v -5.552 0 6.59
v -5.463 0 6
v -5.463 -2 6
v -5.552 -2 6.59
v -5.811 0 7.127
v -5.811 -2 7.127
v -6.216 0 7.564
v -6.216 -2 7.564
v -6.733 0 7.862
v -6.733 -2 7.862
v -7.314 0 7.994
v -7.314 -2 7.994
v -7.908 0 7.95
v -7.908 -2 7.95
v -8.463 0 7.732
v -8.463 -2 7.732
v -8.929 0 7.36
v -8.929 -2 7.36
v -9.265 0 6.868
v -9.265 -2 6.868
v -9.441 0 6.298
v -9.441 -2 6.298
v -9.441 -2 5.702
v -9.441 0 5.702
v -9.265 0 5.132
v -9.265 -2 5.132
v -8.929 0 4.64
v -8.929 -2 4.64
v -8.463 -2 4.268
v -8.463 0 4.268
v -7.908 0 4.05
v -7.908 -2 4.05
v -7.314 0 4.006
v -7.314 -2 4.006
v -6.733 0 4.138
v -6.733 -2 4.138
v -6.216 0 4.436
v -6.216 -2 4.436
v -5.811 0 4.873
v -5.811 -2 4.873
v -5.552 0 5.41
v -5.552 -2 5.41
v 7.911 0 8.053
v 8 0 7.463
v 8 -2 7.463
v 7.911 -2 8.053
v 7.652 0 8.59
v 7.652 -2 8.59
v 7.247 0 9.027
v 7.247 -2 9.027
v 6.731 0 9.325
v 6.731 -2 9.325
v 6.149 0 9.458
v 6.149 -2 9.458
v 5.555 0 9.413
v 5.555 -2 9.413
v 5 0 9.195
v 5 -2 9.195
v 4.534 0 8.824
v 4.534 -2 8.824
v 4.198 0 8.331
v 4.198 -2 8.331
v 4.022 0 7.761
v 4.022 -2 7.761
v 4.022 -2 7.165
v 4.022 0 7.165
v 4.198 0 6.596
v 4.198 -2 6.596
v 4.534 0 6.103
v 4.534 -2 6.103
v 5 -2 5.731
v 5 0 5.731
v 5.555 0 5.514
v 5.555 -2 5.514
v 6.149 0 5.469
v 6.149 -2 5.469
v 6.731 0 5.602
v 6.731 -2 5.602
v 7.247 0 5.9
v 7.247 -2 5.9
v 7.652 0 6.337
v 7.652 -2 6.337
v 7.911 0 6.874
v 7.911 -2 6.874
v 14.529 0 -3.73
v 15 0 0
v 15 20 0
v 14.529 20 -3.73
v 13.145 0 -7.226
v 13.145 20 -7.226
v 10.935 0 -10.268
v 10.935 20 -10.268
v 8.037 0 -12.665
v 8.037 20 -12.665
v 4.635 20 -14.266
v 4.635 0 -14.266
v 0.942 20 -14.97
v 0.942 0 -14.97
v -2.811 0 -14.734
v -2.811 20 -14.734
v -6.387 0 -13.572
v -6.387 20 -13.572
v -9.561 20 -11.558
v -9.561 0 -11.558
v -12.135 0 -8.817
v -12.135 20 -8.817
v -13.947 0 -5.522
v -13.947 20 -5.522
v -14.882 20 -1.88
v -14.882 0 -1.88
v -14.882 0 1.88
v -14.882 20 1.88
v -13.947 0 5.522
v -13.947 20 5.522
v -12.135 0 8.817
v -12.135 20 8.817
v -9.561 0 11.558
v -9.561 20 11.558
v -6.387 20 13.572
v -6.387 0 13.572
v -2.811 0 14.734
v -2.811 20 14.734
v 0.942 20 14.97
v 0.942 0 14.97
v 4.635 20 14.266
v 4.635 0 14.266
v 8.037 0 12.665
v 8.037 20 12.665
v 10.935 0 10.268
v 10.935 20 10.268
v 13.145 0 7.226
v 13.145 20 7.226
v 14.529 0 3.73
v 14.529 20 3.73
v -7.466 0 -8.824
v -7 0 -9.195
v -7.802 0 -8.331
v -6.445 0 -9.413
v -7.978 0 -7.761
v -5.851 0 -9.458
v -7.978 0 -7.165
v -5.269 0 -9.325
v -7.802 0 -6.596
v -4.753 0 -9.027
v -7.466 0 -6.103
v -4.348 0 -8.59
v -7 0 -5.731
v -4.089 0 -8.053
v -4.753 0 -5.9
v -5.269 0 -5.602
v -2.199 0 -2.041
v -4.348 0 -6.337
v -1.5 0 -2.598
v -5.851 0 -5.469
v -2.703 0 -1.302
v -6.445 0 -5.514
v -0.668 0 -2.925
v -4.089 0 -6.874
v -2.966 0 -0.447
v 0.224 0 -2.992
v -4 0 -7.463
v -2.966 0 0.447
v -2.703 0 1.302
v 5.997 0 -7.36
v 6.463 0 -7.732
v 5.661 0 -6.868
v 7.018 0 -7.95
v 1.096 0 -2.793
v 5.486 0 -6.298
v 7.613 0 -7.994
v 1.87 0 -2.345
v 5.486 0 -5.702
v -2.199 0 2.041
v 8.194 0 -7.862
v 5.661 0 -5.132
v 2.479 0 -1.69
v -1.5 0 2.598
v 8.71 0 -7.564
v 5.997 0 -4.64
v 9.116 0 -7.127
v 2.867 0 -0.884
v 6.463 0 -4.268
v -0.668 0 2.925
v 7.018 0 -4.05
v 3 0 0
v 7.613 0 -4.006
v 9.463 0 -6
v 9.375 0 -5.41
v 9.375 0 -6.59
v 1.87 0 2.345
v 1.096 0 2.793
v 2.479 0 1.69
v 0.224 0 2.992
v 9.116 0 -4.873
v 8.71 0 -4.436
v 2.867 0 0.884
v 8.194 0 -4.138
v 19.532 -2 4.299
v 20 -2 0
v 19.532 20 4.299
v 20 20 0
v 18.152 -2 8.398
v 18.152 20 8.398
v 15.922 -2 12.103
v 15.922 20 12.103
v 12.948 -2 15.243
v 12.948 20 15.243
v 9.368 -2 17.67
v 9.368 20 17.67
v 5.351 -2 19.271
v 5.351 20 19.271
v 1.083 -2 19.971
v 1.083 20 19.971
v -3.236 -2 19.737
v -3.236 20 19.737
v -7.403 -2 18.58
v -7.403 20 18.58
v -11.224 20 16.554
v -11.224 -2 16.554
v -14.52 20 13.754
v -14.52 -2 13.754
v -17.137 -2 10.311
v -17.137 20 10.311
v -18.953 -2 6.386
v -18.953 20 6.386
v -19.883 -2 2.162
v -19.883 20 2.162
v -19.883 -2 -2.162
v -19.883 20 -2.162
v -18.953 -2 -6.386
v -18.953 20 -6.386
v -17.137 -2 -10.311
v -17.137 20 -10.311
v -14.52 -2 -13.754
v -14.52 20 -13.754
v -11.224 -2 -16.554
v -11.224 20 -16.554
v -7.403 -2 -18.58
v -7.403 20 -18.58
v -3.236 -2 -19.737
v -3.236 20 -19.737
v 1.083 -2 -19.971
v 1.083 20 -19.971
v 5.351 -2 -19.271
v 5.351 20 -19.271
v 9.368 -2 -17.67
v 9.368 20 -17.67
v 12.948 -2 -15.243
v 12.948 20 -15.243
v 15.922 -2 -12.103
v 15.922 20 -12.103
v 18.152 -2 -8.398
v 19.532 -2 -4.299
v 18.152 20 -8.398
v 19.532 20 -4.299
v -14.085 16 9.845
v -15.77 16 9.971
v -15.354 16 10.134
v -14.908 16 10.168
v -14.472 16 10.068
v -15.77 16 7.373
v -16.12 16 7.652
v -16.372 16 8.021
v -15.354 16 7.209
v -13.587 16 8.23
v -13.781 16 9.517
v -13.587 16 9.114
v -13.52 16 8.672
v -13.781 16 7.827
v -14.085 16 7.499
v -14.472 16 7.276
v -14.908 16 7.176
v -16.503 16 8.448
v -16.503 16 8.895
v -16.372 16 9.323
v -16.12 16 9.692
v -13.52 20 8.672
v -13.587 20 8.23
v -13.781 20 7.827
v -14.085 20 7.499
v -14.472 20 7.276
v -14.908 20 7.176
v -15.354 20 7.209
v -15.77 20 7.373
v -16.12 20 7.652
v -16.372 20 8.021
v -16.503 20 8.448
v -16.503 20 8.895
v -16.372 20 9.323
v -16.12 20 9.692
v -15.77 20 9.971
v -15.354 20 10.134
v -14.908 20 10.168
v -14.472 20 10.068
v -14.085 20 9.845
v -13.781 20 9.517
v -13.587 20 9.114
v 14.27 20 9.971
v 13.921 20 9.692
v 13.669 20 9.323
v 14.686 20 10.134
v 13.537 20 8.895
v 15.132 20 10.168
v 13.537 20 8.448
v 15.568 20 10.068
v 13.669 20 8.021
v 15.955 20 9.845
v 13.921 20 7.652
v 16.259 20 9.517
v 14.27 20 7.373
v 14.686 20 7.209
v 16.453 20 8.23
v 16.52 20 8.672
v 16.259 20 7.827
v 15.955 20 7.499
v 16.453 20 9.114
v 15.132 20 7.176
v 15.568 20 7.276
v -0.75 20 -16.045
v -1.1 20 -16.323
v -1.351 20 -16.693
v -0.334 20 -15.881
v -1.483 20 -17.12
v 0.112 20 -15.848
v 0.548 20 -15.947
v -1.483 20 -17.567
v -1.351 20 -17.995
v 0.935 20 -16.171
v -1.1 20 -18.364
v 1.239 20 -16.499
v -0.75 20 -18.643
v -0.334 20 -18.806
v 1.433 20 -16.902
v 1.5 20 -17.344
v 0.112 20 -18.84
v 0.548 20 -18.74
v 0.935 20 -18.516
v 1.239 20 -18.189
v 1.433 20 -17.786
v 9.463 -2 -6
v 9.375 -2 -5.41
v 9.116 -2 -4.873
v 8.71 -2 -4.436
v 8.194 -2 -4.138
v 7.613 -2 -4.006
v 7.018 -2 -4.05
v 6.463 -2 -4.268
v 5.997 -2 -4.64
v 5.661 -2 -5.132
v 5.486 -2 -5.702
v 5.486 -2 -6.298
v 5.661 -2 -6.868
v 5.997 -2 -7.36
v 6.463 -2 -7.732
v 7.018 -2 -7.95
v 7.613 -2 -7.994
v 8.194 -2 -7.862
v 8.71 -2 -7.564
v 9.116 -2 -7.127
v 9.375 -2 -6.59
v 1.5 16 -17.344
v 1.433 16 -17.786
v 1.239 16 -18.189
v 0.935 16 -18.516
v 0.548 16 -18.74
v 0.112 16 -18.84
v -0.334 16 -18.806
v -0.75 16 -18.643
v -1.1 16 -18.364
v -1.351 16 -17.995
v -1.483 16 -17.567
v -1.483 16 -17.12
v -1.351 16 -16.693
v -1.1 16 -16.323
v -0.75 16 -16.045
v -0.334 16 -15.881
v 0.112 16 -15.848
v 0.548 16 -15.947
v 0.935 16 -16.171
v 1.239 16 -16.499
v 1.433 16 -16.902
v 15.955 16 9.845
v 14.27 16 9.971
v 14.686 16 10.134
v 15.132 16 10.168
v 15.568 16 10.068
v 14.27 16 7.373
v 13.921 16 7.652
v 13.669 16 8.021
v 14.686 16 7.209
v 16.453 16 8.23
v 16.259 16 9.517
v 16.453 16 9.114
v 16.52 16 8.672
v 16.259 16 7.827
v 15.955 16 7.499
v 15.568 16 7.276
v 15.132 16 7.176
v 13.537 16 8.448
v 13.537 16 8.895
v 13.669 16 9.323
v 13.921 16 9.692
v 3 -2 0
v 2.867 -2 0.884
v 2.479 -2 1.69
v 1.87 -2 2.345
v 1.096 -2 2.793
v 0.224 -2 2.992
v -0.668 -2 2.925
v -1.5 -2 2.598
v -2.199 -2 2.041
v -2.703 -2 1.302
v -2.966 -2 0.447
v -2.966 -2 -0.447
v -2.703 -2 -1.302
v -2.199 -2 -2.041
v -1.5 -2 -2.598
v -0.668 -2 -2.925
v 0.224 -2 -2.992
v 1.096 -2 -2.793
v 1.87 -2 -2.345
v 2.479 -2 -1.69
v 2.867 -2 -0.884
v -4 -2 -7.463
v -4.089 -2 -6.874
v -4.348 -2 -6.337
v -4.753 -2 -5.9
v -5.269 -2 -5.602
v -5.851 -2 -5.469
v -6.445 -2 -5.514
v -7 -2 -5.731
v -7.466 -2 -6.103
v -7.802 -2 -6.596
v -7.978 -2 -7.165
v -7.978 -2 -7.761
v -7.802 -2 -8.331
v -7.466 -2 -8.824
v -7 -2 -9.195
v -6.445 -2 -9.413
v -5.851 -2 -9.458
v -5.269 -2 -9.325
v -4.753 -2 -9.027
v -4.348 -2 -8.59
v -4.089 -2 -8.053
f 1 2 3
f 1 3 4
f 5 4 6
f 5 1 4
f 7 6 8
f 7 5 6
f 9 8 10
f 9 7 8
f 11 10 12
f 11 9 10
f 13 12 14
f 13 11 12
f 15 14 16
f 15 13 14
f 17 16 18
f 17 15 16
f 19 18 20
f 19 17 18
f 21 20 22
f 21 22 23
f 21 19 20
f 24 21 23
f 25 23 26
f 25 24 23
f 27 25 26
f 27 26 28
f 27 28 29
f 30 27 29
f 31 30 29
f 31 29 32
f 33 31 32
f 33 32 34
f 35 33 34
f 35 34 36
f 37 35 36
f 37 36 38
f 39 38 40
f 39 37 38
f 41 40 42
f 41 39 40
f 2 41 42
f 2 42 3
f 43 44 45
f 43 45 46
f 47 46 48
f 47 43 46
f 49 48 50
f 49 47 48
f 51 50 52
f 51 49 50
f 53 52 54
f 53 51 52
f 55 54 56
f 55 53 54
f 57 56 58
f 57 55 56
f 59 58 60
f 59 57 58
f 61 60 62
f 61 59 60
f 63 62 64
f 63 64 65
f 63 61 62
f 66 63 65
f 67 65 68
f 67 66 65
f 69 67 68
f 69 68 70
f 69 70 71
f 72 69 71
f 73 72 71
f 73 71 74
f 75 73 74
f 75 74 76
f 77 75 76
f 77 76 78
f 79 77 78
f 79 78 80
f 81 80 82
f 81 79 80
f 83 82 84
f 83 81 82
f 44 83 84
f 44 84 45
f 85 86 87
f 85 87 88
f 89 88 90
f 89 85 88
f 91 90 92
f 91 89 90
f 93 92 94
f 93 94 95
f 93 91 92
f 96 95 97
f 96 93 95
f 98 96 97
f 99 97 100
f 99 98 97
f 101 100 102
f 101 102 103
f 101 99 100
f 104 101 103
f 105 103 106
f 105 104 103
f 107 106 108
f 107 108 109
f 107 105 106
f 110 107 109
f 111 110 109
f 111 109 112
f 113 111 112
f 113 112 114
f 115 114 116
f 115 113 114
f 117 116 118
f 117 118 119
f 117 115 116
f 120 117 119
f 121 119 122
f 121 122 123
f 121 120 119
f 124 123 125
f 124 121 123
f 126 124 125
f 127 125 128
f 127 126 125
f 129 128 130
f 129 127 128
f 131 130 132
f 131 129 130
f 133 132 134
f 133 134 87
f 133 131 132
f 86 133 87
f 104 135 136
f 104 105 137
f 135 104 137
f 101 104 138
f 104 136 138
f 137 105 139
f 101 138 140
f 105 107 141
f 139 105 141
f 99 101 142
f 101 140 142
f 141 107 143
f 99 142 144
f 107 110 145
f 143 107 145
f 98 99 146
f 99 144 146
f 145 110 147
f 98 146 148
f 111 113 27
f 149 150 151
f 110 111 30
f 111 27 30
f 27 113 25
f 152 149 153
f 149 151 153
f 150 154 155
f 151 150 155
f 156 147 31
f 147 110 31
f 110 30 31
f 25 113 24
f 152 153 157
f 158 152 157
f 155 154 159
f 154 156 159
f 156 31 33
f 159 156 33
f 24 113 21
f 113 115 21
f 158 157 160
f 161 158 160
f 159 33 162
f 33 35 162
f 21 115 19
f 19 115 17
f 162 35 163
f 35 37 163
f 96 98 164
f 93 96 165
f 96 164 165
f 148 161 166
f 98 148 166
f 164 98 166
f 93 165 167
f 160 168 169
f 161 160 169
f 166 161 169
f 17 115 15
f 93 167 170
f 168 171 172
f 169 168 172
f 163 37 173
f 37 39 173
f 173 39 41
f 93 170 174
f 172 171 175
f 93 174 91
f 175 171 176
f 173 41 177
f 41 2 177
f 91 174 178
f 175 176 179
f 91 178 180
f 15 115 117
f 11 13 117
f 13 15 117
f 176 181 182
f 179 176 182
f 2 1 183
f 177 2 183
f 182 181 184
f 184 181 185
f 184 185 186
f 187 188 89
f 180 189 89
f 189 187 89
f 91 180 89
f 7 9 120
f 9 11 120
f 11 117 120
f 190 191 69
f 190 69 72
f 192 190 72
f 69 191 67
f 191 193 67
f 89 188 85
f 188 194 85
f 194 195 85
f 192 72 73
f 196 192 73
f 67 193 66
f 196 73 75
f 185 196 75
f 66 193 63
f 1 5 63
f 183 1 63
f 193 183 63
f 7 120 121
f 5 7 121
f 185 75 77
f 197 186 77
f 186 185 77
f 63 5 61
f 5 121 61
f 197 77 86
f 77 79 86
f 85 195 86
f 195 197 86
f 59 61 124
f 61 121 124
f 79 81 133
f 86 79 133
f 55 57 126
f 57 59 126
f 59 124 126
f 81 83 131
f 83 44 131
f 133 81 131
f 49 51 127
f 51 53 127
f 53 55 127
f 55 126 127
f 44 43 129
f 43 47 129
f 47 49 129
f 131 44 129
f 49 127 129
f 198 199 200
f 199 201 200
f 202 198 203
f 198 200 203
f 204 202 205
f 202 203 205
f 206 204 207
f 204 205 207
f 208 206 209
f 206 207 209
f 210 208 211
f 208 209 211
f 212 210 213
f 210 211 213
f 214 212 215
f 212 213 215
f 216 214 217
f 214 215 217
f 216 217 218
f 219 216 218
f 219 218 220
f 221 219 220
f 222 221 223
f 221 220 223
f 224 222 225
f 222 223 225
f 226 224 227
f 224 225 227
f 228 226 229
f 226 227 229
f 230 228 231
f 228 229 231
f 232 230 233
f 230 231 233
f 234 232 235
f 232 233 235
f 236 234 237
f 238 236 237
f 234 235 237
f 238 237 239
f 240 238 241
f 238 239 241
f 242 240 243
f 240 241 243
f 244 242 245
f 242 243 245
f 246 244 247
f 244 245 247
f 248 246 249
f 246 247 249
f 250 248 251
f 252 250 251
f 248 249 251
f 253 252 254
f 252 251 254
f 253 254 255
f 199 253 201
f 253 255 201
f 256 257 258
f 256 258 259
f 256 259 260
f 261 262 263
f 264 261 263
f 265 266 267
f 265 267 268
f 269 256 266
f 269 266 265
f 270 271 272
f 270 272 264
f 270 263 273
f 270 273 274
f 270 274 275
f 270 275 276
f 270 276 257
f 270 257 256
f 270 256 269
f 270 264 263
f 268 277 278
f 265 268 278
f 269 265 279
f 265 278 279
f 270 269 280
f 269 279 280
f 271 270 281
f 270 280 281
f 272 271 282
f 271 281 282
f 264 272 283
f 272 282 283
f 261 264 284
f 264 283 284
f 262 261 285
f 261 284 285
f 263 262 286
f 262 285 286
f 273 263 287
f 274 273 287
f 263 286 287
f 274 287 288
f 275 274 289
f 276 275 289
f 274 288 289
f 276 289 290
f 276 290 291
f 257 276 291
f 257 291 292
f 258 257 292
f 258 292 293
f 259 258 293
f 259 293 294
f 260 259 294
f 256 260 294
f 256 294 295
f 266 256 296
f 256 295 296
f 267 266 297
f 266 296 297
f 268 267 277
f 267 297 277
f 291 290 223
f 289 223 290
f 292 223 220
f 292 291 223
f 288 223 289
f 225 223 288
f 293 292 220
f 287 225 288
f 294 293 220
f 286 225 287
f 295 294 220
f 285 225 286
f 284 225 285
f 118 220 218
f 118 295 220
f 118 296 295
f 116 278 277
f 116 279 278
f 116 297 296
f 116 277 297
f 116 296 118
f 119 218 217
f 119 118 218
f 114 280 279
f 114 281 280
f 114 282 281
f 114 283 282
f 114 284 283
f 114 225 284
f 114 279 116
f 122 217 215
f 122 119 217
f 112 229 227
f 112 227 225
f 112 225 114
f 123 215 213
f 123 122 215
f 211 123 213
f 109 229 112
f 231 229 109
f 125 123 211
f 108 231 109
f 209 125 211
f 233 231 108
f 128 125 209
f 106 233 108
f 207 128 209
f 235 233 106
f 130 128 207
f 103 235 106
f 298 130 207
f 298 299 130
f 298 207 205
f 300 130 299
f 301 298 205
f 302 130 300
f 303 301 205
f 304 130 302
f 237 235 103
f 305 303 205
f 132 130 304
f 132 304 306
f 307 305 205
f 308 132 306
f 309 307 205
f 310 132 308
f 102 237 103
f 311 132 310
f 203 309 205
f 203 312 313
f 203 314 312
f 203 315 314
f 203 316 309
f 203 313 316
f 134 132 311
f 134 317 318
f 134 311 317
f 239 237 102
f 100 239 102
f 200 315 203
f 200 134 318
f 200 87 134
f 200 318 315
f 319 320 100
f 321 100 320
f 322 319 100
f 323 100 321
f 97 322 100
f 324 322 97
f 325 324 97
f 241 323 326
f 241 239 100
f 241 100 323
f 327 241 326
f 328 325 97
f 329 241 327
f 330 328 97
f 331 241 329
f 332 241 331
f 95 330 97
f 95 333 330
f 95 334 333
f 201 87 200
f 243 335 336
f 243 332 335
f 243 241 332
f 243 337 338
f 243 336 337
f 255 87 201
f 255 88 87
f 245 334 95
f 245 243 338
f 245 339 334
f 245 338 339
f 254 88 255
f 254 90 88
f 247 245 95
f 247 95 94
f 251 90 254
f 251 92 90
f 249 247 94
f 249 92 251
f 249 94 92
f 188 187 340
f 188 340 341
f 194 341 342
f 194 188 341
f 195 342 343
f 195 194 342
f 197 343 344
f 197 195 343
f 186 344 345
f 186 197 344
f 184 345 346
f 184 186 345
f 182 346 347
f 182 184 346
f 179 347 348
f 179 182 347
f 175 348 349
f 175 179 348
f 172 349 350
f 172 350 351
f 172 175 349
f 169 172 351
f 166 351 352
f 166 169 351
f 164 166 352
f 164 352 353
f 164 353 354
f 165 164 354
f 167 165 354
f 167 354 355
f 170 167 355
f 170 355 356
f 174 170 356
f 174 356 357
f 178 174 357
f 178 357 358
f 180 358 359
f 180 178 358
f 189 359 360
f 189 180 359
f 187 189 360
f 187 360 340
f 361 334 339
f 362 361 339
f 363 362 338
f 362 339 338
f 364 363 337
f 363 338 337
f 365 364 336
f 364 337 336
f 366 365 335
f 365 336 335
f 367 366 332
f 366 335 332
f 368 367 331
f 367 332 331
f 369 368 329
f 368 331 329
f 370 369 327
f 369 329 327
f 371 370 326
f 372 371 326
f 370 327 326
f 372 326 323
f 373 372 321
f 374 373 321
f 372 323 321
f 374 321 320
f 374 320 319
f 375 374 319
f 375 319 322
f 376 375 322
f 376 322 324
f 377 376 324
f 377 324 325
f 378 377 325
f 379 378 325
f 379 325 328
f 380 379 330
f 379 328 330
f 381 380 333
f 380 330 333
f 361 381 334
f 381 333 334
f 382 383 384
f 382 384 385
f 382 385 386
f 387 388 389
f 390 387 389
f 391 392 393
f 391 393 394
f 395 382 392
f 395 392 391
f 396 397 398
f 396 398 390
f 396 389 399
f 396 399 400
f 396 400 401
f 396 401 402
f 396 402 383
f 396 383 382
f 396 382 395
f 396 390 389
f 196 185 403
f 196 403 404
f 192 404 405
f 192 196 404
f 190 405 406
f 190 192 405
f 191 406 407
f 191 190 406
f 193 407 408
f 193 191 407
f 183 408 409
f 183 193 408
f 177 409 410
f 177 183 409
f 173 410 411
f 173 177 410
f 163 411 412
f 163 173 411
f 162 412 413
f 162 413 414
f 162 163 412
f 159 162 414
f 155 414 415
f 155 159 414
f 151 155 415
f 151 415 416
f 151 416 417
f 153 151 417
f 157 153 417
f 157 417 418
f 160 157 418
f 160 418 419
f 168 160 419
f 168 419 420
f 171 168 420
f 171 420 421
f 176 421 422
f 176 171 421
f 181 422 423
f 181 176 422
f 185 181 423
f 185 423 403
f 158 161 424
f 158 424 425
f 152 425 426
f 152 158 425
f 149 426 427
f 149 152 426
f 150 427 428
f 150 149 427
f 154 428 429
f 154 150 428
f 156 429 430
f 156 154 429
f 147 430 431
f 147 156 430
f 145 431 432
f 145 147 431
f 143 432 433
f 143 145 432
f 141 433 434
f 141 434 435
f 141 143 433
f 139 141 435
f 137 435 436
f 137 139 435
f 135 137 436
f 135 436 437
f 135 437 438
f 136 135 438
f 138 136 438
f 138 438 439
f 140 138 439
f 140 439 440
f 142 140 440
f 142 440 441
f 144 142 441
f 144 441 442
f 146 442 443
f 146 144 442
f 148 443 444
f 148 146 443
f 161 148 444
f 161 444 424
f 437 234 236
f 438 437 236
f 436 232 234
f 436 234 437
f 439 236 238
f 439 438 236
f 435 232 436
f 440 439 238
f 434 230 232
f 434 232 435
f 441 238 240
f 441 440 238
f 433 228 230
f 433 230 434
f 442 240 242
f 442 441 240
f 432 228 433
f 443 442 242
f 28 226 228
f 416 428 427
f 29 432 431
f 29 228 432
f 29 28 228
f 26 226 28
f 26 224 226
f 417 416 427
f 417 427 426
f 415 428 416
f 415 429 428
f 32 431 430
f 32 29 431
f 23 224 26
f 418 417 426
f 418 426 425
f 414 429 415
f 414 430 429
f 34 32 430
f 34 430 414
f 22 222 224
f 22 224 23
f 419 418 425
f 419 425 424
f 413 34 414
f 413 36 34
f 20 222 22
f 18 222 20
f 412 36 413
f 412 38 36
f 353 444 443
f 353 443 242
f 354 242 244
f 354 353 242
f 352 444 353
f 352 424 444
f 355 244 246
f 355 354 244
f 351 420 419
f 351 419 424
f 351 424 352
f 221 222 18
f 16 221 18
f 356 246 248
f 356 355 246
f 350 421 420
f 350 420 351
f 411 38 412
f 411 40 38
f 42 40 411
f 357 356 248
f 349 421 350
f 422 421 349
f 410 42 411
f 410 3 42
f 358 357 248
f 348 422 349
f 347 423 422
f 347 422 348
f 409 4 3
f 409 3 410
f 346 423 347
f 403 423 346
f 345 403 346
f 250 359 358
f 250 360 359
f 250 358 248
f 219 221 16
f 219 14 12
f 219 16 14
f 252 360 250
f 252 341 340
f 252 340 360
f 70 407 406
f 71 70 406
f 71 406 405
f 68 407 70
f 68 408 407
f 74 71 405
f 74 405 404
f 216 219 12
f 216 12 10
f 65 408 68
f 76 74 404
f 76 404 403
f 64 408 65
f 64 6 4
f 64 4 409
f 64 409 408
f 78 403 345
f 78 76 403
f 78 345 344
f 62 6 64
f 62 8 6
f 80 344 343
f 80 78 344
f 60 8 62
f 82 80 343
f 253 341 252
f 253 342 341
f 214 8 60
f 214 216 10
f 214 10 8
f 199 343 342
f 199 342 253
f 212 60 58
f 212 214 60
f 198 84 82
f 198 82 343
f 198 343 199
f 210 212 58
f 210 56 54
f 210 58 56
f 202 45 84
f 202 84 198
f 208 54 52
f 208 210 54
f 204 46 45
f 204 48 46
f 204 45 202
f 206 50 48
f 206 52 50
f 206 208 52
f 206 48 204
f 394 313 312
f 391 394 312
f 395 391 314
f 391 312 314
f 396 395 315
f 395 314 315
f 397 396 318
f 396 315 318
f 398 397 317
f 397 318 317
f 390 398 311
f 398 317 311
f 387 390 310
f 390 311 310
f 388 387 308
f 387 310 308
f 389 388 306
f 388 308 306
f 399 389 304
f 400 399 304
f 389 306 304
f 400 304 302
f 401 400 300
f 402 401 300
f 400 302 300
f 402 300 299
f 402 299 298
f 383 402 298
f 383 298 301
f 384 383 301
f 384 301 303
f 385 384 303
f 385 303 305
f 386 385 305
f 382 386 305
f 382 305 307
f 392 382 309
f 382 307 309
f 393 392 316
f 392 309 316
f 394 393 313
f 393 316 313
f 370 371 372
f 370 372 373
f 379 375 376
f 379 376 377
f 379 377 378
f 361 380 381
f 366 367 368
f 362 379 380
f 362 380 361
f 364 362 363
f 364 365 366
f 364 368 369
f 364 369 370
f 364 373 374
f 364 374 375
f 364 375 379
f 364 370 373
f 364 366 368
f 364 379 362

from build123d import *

# Parameters (mm, degrees)
SKETCH1_R           = 20
SKETCH1_R_2         = 15
BOSS_EXTRUDE1_DEPTH = 20
SKETCH2_R           = 20
SKETCH2_R_2         = 3
SKETCH2_R_3         = 2
BOSS_EXTRUDE2_DEPTH = 2
SKETCH3_R           = 1.5
CUT_EXTRUDE1_DEPTH  = 4


with BuildPart() as part:
    # Sketch1 → Boss-Extrude1 (new body)
    with BuildSketch(Plane(origin=(0, 0, 0), x_dir=(1, 0, 0), z_dir=(0, 1, 0))):
        Circle(SKETCH1_R)
        Circle(SKETCH1_R_2, mode=Mode.SUBTRACT)
    extrude(amount=BOSS_EXTRUDE1_DEPTH)

    # Sketch2 → Boss-Extrude2 (add)
    with BuildSketch(Plane.XZ):
        Circle(SKETCH2_R)
        Circle(SKETCH2_R_2, mode=Mode.SUBTRACT)
        with Locations((6, 7.463372557)):
            Circle(SKETCH2_R_3, mode=Mode.SUBTRACT)
        with Locations((7.463372557, -6)):
            Circle(SKETCH2_R_3, mode=Mode.SUBTRACT)
        with Locations((-6, -7.463372557)):
            Circle(SKETCH2_R_3, mode=Mode.SUBTRACT)
        with Locations((-7.463372557, 6)):
            Circle(SKETCH2_R_3, mode=Mode.SUBTRACT)
    extrude(amount=BOSS_EXTRUDE2_DEPTH)

    # Sketch3 → Cut-Extrude1 (cut)
    with BuildSketch(Plane(origin=(0, 20, 0), x_dir=(1, 0, 0), z_dir=(0, 1, 0))):
        with Locations((0, 17.343709181)):
            Circle(SKETCH3_R)
        with Locations((15.020092746, -8.67185459)):
            Circle(SKETCH3_R)
        with Locations((-15.020092746, -8.67185459)):
            Circle(SKETCH3_R)
    extrude(amount=-CUT_EXTRUDE1_DEPTH, mode=Mode.SUBTRACT)


solid = part.part
